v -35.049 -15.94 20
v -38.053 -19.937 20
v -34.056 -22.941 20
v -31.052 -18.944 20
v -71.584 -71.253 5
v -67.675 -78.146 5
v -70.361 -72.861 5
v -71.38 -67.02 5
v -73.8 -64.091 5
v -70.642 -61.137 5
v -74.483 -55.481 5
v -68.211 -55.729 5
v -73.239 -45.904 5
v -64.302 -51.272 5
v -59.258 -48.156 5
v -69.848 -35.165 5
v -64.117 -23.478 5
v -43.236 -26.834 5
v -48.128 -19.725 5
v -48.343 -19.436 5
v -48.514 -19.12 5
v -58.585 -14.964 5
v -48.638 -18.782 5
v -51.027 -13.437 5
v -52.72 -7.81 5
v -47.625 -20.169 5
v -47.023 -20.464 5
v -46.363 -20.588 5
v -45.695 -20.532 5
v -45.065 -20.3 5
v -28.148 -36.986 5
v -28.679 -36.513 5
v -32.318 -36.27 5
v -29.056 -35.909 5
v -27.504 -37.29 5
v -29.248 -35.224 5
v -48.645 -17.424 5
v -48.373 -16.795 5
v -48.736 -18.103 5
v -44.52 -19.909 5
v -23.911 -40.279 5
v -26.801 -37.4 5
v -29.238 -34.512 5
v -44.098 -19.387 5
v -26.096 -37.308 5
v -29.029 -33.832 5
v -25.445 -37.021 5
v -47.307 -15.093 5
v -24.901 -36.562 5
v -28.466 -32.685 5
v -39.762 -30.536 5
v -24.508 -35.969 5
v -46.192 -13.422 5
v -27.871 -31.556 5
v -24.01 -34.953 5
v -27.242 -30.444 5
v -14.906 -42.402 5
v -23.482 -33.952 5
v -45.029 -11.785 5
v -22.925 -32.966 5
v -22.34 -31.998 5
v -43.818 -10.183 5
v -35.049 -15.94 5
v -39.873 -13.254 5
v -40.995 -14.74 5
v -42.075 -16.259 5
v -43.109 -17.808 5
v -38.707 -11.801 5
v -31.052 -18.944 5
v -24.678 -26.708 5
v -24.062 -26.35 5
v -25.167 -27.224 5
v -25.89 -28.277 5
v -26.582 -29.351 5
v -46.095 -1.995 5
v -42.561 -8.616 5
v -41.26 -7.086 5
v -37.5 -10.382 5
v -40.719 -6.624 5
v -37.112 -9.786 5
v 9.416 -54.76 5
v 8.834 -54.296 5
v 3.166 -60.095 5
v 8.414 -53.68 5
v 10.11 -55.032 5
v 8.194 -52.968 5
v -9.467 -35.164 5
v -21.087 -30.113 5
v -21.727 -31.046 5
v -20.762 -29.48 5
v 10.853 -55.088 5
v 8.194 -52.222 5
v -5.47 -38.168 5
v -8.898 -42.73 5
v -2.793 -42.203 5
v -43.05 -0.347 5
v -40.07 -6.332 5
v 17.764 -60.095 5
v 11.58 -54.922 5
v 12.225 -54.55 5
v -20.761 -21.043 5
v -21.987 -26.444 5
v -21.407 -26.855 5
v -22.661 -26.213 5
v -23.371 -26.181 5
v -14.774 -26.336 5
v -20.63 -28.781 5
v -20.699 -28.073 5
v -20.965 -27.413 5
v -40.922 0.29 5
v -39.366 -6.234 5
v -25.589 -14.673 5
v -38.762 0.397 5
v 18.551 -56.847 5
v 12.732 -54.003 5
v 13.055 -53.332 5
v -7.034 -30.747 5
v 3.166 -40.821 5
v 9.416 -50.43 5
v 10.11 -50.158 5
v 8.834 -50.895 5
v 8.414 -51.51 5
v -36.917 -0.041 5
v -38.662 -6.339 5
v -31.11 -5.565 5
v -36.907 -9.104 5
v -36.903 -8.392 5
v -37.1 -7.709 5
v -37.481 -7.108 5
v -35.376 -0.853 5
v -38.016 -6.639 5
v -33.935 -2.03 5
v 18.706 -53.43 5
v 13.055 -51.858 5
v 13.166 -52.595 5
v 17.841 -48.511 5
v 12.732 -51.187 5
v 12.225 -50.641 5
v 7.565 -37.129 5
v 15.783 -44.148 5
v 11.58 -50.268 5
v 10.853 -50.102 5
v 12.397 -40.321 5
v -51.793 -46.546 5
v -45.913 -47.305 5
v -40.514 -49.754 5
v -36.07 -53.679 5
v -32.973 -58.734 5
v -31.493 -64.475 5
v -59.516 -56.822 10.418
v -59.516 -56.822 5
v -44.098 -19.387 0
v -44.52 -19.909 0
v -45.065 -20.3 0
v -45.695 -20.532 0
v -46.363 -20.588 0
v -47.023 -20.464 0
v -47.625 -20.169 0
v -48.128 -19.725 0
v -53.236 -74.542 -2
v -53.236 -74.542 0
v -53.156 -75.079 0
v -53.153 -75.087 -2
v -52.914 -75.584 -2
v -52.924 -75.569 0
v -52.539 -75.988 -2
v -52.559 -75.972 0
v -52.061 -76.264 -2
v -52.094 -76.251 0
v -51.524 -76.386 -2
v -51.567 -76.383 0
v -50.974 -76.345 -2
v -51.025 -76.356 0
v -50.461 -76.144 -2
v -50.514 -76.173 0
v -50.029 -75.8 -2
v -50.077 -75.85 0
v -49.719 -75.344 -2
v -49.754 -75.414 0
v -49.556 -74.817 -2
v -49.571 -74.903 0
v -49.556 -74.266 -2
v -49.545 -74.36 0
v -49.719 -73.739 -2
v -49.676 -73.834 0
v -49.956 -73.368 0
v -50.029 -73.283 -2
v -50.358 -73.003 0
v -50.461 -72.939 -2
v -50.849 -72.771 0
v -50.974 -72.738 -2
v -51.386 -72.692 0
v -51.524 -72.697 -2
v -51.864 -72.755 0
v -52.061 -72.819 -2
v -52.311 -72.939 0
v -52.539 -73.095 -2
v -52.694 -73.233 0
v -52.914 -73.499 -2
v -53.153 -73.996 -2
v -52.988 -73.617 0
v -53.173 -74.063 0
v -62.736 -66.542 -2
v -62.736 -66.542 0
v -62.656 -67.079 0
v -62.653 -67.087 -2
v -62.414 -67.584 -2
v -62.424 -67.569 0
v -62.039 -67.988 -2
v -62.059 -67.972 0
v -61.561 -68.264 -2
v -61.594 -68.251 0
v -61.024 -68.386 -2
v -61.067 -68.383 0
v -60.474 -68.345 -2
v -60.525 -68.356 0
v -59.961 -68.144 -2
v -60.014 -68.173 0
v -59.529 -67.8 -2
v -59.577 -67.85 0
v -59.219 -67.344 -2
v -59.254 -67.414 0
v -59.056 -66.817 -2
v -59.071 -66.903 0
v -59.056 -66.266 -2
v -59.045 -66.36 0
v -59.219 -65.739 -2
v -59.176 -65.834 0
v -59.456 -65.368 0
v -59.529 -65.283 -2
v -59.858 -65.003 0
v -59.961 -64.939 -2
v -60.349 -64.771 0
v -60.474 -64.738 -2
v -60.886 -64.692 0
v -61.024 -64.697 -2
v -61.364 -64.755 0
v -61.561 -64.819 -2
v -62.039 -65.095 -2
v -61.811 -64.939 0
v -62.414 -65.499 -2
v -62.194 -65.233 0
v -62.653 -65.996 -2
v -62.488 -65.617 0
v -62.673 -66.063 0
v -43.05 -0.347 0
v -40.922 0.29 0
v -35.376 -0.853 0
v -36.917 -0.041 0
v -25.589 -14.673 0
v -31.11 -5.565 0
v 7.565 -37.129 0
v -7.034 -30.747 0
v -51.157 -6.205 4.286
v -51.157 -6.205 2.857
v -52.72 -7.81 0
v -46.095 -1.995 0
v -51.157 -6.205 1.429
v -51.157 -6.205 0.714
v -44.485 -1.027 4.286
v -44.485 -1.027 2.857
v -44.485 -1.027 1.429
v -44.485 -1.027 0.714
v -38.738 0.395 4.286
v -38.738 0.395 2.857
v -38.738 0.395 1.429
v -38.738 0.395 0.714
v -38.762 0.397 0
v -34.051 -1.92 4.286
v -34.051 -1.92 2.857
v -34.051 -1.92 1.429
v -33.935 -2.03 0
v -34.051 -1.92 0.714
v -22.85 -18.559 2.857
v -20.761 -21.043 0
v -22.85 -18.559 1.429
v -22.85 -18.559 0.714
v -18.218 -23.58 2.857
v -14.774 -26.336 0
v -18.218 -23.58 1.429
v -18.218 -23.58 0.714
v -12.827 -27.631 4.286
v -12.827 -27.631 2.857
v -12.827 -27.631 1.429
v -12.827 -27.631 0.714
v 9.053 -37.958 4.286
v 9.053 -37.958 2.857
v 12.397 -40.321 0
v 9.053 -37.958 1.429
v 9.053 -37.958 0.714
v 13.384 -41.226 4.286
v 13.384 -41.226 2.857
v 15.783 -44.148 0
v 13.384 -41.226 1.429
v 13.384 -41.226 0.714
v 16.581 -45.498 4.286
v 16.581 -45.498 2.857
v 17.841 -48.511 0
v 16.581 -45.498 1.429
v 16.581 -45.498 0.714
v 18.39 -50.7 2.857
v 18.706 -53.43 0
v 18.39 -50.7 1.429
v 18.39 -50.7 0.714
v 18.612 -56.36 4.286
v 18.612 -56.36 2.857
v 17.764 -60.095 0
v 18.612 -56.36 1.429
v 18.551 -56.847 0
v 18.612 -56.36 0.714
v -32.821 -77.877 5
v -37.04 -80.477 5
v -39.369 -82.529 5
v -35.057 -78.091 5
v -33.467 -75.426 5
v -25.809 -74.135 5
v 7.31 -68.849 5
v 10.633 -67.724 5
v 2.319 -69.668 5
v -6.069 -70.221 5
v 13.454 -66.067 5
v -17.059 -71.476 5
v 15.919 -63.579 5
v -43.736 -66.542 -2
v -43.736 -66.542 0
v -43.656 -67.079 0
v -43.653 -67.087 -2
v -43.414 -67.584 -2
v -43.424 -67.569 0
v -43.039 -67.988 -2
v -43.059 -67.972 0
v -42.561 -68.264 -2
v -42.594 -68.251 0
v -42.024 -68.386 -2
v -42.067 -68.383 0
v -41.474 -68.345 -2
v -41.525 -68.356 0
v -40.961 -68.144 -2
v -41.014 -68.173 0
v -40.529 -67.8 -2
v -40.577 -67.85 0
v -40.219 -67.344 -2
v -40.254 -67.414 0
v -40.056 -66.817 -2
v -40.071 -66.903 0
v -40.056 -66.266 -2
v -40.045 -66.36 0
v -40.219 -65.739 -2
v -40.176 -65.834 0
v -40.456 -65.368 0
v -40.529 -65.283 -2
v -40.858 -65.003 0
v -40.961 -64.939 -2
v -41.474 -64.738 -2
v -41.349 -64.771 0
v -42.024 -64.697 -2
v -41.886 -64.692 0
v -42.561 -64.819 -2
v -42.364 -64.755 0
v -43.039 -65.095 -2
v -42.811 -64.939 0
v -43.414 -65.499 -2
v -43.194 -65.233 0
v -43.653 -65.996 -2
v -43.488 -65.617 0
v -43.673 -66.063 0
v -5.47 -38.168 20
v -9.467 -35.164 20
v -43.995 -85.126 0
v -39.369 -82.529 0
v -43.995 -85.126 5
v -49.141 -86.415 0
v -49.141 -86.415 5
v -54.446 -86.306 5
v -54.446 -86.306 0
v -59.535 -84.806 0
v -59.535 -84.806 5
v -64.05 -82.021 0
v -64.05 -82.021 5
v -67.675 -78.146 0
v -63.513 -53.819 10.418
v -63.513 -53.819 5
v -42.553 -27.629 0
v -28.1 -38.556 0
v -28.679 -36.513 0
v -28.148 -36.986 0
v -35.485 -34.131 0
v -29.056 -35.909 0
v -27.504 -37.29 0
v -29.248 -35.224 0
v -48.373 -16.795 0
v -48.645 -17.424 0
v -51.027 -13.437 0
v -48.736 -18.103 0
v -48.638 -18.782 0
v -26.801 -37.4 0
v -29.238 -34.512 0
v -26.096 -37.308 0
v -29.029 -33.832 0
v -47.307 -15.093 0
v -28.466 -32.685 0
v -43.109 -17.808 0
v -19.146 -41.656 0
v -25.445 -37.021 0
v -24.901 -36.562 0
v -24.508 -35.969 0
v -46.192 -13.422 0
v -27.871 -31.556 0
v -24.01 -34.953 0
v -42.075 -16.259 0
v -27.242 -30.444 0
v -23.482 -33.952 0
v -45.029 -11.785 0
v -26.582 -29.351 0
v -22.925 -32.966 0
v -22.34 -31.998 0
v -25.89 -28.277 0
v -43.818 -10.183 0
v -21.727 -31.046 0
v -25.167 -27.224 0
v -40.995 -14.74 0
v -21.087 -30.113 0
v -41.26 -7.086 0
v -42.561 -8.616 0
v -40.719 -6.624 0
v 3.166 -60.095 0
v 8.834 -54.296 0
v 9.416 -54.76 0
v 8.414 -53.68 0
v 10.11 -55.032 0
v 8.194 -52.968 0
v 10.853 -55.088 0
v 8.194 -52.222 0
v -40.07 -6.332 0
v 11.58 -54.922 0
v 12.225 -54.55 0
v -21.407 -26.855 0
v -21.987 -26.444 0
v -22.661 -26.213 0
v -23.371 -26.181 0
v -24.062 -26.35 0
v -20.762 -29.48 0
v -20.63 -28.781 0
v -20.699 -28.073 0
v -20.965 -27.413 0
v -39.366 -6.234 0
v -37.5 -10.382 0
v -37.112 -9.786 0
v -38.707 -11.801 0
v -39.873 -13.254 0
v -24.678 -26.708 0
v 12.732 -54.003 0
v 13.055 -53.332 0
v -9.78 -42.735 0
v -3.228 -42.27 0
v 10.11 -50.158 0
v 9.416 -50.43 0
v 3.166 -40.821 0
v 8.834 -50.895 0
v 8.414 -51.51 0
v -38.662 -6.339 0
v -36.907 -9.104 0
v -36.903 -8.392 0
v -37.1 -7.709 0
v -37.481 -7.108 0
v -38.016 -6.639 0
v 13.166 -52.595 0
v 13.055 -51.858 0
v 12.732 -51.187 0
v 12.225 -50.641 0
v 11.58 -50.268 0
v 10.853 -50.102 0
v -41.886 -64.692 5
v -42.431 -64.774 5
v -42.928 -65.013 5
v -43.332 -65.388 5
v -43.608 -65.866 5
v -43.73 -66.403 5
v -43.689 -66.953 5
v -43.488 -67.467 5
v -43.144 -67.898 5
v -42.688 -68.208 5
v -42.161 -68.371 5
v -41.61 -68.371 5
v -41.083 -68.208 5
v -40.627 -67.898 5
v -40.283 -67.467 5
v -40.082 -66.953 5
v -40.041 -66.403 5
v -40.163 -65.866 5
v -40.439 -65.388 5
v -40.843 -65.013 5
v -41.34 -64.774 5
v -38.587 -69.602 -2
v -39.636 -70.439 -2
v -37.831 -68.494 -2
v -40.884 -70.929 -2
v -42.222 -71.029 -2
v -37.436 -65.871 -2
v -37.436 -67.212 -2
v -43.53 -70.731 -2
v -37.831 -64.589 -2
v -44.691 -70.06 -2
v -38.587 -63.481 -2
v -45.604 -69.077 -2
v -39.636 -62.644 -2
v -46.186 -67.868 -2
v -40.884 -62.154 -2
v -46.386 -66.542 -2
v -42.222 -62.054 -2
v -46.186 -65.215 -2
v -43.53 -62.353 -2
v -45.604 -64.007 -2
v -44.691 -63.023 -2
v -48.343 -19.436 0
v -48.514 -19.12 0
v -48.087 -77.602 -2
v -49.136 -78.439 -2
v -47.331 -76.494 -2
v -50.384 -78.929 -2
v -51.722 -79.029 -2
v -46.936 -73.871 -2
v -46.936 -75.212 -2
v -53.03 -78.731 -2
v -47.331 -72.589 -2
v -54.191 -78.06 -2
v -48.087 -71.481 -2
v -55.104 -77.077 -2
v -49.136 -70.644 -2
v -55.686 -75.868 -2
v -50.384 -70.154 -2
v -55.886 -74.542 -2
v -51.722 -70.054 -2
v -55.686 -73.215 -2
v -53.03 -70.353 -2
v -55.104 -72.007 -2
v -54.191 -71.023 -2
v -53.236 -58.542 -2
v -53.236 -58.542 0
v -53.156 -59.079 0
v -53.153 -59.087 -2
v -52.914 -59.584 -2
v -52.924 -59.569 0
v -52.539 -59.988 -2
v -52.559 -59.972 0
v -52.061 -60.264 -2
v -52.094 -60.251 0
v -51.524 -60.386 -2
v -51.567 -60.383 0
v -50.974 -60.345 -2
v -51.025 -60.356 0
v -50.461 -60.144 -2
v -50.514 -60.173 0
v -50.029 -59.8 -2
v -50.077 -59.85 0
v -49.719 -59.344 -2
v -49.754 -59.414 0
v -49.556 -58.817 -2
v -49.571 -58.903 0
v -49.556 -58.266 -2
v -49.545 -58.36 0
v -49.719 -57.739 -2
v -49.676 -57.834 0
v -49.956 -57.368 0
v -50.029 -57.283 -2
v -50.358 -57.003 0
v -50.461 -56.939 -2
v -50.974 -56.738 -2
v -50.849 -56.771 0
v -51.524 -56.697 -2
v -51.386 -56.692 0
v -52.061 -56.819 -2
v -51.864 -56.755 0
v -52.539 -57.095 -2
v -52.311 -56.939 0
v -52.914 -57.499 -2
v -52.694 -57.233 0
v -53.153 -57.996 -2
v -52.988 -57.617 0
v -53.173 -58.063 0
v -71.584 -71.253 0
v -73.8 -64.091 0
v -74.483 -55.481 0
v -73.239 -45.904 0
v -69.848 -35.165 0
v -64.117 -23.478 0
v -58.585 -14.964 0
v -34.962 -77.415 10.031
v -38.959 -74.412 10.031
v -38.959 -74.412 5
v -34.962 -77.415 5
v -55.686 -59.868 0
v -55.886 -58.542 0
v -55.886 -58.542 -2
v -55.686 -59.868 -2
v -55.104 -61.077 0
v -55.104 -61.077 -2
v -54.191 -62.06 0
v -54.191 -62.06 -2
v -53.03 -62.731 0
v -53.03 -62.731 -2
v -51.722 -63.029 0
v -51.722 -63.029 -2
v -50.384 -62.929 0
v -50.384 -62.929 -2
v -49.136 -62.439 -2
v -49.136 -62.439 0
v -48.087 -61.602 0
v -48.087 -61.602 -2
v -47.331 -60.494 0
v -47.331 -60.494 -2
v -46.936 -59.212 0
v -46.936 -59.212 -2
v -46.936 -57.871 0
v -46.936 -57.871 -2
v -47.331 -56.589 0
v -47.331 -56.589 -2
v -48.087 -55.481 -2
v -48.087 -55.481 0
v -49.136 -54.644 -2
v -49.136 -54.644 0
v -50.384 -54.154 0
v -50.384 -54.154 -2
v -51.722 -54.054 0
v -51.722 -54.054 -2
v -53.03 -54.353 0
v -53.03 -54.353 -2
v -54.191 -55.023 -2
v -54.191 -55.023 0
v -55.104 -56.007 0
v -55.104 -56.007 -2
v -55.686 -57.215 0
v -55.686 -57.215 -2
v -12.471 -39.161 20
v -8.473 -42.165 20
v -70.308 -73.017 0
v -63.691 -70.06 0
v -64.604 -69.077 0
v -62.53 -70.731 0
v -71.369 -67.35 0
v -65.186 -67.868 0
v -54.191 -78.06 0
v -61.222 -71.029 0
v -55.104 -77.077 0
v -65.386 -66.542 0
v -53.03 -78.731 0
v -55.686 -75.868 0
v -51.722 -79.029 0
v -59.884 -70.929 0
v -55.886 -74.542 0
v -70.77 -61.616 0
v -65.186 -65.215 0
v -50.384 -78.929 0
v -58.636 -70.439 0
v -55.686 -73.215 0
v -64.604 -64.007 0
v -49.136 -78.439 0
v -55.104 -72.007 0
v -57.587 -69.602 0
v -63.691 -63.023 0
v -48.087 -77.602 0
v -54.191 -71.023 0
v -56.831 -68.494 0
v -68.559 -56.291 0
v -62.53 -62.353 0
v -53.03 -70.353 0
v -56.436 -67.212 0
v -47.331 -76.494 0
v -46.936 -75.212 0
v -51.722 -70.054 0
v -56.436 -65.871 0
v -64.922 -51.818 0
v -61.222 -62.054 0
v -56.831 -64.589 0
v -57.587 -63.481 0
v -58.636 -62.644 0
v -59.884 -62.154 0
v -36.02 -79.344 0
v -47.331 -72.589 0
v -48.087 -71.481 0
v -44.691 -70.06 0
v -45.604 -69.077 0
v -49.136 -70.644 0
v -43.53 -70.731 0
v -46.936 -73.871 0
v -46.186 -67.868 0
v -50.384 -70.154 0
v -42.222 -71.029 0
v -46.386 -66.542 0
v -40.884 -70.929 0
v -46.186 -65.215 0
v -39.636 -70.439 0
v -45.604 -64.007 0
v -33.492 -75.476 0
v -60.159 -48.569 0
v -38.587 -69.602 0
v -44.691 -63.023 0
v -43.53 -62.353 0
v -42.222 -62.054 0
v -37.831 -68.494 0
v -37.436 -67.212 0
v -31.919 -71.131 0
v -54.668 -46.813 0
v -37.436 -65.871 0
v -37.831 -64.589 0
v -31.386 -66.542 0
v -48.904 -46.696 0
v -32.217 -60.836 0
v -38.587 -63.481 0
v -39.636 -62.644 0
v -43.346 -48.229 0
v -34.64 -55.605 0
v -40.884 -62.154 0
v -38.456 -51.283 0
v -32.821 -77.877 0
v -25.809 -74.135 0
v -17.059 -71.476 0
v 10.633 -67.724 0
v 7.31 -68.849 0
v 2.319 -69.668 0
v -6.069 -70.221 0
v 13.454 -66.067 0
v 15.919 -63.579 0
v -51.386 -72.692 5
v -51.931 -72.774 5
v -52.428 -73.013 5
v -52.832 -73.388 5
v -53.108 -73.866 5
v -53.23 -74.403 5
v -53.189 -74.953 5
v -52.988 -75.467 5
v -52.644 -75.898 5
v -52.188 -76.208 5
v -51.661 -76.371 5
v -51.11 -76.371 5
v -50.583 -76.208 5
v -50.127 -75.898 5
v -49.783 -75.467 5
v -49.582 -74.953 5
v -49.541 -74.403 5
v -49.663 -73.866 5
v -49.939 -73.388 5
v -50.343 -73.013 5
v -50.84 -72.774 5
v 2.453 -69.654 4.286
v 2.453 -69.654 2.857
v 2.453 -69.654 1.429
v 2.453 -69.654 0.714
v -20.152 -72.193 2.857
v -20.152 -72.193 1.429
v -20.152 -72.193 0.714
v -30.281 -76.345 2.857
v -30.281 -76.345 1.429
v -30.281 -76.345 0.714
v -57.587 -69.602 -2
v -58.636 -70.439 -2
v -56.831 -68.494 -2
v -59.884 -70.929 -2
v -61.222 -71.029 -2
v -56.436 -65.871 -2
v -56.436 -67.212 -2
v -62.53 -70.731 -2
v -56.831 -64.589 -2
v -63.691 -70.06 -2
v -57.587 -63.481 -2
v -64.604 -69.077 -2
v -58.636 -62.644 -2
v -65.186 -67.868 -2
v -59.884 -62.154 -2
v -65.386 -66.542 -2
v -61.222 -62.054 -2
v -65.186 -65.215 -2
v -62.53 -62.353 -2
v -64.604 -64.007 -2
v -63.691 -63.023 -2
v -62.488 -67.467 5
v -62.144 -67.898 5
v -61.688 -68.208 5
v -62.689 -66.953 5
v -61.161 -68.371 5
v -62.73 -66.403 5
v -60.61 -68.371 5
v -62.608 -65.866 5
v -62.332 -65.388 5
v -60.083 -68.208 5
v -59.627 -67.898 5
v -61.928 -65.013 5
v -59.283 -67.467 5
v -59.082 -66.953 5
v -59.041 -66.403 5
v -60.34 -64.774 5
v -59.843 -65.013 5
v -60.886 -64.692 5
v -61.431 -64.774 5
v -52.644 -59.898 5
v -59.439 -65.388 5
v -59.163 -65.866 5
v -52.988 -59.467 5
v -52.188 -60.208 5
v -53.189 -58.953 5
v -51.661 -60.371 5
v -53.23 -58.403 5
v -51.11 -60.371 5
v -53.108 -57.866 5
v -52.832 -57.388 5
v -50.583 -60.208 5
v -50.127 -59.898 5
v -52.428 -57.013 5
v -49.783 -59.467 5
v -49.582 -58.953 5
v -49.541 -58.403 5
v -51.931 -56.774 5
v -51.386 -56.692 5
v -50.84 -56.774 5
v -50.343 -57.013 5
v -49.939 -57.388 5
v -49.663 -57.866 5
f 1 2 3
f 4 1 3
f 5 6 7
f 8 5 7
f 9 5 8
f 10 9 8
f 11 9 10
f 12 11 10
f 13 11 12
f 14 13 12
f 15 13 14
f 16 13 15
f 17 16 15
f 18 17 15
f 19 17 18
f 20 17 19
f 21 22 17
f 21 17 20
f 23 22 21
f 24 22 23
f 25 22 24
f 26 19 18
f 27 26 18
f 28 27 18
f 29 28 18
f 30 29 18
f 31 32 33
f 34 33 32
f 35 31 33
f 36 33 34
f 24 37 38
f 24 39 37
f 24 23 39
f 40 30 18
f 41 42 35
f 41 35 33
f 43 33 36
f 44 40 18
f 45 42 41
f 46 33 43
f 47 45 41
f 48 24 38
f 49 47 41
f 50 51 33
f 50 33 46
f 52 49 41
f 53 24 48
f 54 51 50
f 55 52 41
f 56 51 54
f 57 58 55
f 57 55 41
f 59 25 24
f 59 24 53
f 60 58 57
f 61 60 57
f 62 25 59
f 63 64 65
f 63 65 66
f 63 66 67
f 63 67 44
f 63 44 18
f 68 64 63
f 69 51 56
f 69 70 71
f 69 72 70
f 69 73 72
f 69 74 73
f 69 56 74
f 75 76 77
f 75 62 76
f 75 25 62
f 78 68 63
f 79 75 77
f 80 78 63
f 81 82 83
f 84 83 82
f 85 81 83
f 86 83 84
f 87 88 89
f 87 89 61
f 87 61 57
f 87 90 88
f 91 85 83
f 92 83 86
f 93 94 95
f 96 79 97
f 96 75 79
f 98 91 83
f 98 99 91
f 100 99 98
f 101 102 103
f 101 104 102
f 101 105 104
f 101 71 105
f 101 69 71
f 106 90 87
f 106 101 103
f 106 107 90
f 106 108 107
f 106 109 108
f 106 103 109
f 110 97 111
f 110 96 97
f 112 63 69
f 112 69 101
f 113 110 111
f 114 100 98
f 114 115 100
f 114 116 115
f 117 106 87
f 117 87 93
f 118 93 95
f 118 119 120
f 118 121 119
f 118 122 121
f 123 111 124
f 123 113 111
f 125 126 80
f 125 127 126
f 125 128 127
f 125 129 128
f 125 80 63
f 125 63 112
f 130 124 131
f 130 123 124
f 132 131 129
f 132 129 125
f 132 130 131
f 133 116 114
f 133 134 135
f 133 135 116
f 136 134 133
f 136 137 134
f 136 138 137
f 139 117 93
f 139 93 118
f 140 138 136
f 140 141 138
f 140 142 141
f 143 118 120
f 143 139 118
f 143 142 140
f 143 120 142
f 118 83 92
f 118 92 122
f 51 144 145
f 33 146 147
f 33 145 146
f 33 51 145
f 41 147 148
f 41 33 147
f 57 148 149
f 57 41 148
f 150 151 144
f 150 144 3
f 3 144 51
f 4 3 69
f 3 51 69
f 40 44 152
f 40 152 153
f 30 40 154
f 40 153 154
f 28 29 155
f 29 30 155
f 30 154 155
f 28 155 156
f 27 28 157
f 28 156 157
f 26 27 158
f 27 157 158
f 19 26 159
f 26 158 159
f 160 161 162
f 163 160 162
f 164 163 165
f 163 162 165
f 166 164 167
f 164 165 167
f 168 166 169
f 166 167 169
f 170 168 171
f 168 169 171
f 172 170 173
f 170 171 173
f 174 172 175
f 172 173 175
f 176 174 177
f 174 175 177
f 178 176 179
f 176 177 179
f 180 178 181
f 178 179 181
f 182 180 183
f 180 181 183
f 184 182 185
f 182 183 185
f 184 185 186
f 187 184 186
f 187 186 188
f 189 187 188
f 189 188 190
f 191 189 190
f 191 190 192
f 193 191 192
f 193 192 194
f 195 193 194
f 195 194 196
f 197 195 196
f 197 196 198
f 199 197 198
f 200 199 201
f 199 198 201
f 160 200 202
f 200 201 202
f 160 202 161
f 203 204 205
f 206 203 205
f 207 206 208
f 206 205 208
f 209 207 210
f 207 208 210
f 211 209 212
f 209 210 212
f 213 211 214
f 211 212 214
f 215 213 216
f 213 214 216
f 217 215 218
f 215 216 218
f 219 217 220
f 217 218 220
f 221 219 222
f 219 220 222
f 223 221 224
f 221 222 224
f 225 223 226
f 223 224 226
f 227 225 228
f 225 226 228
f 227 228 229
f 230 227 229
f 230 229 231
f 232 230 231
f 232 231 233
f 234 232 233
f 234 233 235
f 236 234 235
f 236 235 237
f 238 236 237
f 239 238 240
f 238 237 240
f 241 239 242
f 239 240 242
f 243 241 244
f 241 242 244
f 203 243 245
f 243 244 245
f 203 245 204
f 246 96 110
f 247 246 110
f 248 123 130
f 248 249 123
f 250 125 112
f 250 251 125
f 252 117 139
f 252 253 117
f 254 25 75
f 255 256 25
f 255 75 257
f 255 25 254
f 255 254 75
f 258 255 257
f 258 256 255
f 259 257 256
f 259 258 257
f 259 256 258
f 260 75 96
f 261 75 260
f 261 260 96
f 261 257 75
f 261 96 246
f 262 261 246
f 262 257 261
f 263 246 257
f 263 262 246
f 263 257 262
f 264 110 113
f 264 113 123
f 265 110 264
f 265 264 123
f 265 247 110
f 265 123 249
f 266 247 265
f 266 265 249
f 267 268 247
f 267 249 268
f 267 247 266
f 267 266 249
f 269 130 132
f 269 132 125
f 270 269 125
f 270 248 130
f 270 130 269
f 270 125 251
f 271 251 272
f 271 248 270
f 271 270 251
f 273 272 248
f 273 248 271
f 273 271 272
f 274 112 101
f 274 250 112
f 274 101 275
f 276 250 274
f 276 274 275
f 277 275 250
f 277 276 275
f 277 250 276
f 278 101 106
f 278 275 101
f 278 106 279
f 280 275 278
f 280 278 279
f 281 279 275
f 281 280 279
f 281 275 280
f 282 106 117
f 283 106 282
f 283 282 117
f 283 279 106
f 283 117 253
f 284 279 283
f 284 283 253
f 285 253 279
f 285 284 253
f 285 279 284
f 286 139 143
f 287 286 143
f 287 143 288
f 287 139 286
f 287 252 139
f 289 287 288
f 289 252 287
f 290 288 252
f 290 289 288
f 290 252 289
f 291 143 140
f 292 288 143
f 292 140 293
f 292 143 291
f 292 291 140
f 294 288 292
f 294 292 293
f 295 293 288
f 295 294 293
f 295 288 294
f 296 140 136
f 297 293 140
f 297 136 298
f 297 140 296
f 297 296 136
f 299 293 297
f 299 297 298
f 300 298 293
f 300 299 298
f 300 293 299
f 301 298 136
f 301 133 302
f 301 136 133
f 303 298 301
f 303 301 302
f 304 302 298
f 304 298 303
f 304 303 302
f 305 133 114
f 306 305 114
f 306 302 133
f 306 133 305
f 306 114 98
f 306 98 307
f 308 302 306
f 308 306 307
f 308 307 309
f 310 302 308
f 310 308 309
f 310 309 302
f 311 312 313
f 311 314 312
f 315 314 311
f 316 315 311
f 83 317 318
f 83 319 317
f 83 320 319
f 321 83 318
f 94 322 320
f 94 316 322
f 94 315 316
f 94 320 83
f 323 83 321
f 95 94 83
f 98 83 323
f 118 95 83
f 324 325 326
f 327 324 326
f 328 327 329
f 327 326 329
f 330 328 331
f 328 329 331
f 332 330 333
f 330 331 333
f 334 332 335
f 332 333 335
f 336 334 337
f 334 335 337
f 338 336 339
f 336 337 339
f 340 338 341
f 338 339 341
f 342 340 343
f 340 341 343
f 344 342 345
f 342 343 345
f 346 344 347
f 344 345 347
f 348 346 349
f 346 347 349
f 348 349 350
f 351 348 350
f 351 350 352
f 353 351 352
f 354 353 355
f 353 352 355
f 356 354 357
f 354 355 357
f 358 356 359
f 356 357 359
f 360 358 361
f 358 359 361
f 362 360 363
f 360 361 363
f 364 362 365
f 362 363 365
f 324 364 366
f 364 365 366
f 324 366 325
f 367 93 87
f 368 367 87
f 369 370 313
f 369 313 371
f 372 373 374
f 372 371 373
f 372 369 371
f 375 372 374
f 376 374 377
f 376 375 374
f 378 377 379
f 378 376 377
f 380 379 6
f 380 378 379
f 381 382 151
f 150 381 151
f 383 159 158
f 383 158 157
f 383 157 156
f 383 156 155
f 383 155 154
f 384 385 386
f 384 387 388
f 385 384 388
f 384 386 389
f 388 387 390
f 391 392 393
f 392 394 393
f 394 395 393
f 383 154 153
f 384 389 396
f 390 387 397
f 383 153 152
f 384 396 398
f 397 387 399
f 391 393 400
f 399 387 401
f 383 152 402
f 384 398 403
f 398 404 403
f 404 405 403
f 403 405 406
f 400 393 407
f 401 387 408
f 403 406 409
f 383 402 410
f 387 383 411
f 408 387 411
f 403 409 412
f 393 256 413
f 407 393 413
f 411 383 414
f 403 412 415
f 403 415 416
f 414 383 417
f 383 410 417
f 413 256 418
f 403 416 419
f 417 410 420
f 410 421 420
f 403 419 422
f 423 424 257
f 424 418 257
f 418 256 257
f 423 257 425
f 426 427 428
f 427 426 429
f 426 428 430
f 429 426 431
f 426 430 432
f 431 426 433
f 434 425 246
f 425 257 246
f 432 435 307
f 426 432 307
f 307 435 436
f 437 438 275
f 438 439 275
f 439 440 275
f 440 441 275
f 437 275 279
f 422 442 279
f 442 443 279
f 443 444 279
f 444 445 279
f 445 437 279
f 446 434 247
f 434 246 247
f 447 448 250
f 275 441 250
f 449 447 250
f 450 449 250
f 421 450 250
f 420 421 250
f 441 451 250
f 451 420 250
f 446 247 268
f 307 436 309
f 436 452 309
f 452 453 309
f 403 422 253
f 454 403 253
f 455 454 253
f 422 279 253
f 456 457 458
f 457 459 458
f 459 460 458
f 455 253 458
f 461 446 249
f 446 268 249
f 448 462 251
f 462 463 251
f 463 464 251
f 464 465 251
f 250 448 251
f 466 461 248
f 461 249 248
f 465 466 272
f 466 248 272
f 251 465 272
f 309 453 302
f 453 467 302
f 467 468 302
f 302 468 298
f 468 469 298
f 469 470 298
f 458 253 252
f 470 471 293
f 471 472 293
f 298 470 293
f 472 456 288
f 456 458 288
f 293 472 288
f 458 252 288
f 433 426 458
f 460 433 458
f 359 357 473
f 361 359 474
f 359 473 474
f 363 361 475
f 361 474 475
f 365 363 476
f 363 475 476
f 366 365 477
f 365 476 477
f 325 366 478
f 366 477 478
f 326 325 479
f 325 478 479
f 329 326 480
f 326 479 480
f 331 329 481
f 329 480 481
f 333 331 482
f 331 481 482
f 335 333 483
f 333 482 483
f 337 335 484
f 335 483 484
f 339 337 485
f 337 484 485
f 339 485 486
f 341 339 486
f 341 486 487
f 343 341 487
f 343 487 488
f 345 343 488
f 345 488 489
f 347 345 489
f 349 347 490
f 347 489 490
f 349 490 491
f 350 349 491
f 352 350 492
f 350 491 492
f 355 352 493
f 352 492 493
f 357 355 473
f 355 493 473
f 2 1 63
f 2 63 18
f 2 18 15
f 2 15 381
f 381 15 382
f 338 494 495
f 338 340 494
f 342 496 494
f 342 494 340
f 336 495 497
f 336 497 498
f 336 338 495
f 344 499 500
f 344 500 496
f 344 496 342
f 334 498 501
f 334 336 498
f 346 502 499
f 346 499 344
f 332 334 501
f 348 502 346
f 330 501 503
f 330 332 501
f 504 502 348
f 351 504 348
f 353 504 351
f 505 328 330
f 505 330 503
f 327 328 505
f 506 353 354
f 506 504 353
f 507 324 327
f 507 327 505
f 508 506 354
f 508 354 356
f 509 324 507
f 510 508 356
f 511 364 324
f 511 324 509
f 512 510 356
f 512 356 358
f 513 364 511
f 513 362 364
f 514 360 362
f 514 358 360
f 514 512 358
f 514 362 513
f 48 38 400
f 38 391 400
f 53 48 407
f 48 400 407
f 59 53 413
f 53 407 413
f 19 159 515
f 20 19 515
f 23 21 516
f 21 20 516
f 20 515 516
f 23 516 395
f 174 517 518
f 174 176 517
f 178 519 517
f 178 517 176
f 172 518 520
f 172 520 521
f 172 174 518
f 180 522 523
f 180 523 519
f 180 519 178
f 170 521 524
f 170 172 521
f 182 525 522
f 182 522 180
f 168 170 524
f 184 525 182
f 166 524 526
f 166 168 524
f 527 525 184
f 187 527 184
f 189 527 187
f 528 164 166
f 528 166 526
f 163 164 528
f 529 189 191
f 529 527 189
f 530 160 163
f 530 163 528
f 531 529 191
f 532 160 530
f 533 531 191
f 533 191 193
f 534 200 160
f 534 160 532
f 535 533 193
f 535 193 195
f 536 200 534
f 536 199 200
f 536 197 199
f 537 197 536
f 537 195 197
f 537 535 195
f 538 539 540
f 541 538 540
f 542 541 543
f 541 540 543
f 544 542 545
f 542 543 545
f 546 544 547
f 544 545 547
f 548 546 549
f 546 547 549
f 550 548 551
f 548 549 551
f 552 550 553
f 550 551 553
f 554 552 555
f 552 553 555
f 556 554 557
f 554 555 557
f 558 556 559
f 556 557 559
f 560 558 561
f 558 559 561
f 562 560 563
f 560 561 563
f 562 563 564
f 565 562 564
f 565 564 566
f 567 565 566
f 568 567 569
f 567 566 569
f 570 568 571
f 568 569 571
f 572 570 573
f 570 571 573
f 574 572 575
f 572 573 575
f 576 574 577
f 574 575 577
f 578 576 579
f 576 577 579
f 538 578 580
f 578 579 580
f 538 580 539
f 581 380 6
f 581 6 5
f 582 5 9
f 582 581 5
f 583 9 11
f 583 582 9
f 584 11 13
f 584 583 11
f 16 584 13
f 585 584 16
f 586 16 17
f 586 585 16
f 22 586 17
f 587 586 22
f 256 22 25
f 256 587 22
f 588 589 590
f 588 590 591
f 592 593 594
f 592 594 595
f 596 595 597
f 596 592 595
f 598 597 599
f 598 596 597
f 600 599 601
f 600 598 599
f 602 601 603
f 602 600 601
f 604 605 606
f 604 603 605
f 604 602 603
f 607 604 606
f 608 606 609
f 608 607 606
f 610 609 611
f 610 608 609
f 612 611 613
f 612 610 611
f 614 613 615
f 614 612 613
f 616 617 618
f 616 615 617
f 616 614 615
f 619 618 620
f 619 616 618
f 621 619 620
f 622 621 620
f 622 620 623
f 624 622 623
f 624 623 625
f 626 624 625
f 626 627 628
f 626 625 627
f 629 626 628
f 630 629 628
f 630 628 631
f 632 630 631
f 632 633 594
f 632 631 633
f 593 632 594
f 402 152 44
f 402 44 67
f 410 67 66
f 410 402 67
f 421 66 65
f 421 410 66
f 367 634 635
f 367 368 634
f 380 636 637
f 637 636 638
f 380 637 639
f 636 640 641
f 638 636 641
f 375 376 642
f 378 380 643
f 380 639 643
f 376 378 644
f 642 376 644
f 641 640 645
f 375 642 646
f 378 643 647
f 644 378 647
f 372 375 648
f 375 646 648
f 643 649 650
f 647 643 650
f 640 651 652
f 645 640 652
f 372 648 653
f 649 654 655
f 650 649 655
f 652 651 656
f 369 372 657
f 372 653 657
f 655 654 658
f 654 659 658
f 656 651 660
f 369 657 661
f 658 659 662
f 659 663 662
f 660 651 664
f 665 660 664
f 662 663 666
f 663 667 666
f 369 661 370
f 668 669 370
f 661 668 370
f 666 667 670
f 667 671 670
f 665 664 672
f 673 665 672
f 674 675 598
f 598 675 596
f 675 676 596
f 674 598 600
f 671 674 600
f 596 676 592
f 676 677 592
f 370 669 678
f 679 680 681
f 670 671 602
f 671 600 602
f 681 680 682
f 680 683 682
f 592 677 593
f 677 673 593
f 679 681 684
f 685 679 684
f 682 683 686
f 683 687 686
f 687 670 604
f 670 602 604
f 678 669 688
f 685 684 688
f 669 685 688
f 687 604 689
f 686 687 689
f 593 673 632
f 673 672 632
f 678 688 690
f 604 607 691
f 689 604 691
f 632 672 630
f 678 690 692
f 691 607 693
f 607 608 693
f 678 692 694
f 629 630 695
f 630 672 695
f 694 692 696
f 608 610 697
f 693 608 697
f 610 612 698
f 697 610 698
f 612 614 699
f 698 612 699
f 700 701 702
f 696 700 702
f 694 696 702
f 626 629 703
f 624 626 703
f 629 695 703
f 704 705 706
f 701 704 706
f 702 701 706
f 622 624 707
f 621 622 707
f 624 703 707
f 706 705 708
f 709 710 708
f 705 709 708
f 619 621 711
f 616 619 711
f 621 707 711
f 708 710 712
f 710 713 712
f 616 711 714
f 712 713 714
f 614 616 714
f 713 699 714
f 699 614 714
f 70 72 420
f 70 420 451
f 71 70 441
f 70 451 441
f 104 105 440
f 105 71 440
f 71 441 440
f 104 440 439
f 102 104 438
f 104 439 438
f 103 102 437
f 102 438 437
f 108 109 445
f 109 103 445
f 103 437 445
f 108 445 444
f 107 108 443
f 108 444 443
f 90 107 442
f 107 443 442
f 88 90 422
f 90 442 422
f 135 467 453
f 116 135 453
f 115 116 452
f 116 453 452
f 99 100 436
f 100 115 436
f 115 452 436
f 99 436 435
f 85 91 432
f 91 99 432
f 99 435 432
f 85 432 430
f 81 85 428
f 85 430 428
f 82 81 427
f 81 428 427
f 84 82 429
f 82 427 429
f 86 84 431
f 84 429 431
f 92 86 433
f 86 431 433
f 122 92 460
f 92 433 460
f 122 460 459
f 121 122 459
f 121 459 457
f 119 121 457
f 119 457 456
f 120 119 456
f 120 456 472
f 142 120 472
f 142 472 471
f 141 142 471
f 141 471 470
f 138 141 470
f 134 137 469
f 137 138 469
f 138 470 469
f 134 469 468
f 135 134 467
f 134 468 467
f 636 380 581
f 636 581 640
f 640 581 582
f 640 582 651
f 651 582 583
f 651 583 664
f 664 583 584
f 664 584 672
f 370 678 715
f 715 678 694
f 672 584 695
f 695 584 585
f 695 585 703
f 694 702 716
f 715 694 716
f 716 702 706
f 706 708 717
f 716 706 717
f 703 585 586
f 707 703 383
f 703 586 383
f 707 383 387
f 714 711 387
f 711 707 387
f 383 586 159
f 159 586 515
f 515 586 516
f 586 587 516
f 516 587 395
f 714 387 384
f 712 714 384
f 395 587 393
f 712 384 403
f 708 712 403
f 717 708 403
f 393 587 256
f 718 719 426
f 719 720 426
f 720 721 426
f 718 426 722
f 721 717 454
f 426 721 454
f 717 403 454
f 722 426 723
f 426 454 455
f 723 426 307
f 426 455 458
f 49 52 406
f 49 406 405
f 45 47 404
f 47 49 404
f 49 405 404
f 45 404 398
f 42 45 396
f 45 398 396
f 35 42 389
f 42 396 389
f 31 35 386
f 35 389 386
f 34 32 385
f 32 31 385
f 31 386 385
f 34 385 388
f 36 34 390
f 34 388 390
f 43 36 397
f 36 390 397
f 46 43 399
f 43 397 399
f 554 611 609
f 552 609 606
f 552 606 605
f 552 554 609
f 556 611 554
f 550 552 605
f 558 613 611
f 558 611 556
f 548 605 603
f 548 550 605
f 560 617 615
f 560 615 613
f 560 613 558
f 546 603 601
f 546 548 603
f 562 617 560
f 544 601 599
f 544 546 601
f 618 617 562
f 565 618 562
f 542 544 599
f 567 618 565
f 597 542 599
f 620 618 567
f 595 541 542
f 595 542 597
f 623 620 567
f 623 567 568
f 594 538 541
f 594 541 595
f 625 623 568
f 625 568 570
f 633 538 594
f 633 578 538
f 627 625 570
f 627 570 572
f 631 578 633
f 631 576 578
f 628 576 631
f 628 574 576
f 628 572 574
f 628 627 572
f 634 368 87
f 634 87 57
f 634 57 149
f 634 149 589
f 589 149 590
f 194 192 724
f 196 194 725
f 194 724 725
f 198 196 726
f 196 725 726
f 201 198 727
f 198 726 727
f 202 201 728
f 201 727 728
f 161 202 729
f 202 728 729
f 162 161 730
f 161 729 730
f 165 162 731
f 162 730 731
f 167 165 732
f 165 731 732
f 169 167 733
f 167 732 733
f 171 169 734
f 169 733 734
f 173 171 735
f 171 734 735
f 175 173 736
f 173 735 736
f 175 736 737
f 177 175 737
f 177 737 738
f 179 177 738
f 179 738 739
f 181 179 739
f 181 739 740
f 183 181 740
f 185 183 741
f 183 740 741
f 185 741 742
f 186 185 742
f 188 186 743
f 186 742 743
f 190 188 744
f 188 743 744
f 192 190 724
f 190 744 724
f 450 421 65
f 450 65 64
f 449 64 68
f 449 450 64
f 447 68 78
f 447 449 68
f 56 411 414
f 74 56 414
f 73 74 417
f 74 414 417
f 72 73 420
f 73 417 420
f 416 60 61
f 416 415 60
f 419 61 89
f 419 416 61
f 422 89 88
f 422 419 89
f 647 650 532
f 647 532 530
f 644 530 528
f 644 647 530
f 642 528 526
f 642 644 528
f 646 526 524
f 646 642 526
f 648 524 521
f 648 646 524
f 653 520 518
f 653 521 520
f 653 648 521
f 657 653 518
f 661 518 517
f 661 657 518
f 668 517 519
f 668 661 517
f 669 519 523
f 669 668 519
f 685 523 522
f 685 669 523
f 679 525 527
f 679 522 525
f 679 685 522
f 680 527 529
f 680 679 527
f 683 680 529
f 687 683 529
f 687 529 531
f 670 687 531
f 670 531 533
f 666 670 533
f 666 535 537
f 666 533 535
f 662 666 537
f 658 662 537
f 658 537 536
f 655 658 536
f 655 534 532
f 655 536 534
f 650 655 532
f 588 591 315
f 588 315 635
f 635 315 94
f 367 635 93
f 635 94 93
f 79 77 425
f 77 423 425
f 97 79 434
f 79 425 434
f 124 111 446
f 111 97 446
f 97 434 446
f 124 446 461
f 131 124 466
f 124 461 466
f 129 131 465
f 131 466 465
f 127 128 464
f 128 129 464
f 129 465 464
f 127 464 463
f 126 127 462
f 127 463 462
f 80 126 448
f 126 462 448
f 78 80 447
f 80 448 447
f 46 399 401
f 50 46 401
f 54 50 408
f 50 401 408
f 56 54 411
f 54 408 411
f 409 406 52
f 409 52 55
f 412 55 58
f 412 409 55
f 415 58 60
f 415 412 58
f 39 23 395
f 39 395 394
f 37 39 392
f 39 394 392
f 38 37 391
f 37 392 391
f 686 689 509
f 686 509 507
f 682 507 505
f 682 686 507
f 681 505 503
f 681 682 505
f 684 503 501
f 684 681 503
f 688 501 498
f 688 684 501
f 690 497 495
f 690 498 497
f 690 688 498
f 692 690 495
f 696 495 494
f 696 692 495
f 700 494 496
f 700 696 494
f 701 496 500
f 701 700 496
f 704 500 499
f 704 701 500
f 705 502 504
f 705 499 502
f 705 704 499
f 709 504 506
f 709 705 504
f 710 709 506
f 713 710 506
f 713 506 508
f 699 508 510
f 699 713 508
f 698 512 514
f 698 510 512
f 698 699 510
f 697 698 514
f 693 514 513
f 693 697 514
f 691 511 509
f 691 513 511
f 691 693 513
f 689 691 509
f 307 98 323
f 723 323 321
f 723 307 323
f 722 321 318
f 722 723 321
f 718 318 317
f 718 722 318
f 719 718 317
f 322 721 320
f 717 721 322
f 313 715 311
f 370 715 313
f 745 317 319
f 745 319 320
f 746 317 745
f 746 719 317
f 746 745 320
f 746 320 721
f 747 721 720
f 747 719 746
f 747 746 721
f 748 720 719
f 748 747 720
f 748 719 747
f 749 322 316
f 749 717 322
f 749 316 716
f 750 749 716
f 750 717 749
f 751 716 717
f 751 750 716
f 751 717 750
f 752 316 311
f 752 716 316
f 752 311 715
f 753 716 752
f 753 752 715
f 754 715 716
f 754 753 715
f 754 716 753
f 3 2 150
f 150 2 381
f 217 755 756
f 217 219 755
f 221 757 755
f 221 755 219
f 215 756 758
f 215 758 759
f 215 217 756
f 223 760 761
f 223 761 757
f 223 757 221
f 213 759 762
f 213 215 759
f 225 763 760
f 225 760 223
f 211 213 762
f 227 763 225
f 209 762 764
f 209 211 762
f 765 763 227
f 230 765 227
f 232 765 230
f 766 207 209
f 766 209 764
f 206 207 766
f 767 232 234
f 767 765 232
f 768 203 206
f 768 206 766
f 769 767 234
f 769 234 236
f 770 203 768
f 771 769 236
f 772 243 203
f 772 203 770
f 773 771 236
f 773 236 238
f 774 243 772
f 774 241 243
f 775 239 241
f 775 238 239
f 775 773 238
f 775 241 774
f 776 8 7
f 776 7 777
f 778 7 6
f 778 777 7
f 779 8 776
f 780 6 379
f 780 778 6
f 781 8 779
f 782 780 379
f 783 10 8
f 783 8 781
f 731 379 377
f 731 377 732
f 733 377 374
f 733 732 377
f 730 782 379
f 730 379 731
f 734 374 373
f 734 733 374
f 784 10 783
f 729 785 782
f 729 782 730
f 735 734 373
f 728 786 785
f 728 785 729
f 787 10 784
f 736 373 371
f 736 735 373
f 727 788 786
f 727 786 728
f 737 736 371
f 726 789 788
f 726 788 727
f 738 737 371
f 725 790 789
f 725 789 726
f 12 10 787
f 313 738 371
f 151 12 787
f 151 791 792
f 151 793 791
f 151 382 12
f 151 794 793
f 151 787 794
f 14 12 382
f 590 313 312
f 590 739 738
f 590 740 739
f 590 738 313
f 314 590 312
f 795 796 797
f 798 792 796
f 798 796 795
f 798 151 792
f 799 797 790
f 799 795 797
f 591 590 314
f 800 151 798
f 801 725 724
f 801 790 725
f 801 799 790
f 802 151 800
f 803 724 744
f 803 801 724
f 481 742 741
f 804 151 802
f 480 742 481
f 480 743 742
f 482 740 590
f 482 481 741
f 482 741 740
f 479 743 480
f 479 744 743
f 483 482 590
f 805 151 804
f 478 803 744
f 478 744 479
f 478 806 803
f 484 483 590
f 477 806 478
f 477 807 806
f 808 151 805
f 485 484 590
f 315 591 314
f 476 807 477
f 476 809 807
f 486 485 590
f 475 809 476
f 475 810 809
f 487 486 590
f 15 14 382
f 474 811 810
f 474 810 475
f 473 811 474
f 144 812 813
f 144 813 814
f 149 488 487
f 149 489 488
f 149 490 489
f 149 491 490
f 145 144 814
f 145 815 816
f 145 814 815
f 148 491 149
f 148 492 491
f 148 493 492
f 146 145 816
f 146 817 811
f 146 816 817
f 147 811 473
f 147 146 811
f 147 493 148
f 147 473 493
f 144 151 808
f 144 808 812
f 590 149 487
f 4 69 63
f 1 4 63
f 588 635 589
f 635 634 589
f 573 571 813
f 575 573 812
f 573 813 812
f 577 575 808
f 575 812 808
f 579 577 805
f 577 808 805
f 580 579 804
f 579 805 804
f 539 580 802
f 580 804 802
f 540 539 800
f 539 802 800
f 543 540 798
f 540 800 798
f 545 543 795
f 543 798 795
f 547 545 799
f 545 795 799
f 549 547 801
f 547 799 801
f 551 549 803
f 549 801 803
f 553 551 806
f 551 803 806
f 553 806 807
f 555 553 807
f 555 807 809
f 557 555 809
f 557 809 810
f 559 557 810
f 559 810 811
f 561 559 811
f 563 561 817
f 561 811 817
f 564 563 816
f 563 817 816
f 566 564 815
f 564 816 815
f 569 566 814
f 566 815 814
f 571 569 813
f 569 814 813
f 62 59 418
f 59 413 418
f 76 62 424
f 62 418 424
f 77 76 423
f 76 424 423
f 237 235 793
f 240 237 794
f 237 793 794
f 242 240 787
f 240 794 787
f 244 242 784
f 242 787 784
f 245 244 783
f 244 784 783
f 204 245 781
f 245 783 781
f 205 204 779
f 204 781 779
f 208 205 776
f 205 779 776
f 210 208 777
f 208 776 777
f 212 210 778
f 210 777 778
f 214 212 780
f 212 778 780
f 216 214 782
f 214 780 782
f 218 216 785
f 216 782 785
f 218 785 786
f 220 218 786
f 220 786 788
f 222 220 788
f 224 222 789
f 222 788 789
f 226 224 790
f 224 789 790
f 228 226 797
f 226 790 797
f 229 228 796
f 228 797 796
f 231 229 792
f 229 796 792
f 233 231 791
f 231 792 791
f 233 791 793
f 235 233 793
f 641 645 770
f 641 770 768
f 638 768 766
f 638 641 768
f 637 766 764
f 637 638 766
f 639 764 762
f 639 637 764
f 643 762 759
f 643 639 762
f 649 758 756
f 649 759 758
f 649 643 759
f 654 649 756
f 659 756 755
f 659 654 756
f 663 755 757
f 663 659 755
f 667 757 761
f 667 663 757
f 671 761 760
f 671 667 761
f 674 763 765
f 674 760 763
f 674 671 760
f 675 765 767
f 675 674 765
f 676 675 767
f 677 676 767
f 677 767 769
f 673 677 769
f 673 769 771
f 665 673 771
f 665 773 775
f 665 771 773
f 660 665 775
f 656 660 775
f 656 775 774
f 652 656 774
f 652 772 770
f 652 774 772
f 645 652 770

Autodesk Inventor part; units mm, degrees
ref_plane "YZ Plane" through (0, 0, 0) normal (1, 0, 0) x (0, 1, 0)
ref_plane "XZ Plane" through (0, 0, 0) normal (0, 1, 0) x (-1, 0, 0)
ref_plane "XY Plane" through (0, 0, 0) normal (0, 0, 1) x (1, 0, 0)
ref_plane "Work Plane1" through (0, 0, 0) normal (0, 0, 1) x (1, 0, 0)
sketch "Sketch1" plane through (0, 0, 0) normal (0, 0, 1) x (1, 0, 0)
  circle A0 centre (-25.0838, -31.7051) radius 2.5 projected
  circle A1 centre (-43.012, -13.2629) radius 2.5 projected
  circle A2 centre (-44.8914, 13.7567) radius 2.5 projected
  circle A3 centre (-28.0838, 36.7109) radius 2.5 projected
  circle A4 centre (0.8935, 43.7288) radius 2.5 projected
  circle A5 centre (29.5533, 30.4373) radius 2.5 projected
  circle A6 centre (43.6662, -0.0951) radius 2.5 projected
  circle A7 centre (47.6662, -52.5951) radius 2.5 projected
  circle A8 centre (10.6662, -52.5951) radius 2.5 projected
  circle A9 centre (-6.8338, -0.0951) radius 8.75 projected
  line L0 (56.6662, -60.0951) -> (51.1662, -0.0951) projected
  spline S0 degree 4 poles (51.1662, -0.0951) (50.0319, 24.6801) (26.25, 55.8136) (-25.1104, 60.0951) (-56.6662, 18.5311) (-54.7055, -22.2338) (-29.645, -43.1708) (-8.3823, -44.3792) (3.1662, -40.8213) knots 0 0 0 0 0 0.330099 0.457579 0.582312 0.704438 0.895347 0.895347 0.895347 0.895347 0.895347 projected
  line L1 (3.1662, -40.8213) -> (3.1662, -60.0951) projected
  line L2 (3.1662, -60.0951) -> (56.6662, -60.0951) projected
  circle A10 centre (-6.8338, -0.0951) radius 80 construction
  circle A11 centre (-51.3856, -66.5416) radius 20
  spline S1 degree 4 poles (-67.6748, -78.146) (-80.1343, -60.6563) (-73.4442, -28.8039) (-34.6199, 23.5084) (-28.149, -22.306) (-1.1527, -34.0954) (21.6131, -40.077) (20.0804, -79.4594) (-16.1771, -65.3424) (-30.503, -75.865) (-39.3686, -82.5289) knots 0 0 0 0 0 0.227581 0.363335 0.480166 0.59047 0.703016 0.817261 1 1 1 1 1
  line L3 (10.6662, -52.5951) -> (-43.012, -13.2629) construction
  line L4 (-25.0838, -31.7051) -> (10.6662, -52.5951) construction
  line L5 (10.6662, -52.5951) -> (-42.0733, -6.3735) construction
  line L6 (10.6662, -52.5951) -> (-49.6403, -16.0265) construction
  arc A12 (-37.4996, -10.382) -> (-40.9954, -14.7405) centre (10.6662, -52.5951) ccw
  arc A13 (-40.9954, -14.7405) -> (-44.098, -19.3872) centre (10.6662, -52.5951) ccw
  arc A14 (-41.2598, -7.0865) -> (-45.0286, -11.7853) centre (10.6662, -52.5951) ccw
  arc A15 (-45.0286, -11.7853) -> (-48.3734, -16.7947) centre (10.6662, -52.5951) ccw
  arc A16 (-37.4996, -10.382) -> (-41.2598, -7.0865) centre (-39.3797, -8.7342) ccw
  arc A17 (-48.3734, -16.7947) -> (-44.098, -19.3872) centre (-46.2357, -18.0909) ccw
  line L7 (10.6662, -52.5951) -> (-30.2455, -33.2568) construction
  line L8 (10.6662, -52.5951) -> (-26.0132, -26.6253) construction
  arc A18 (-21.0867, -30.1134) -> (-24.5082, -35.9687) centre (10.6662, -52.5951) ccw
  arc A19 (-25.1674, -27.2241) -> (-29.0287, -33.832) centre (10.6662, -52.5951) ccw
  arc A20 (-21.0867, -30.1134) -> (-25.1674, -27.2241) centre (-23.1271, -28.6687) ccw
  arc A21 (-29.0287, -33.832) -> (-24.5082, -35.9687) centre (-26.7685, -34.9004) ccw
  point P0 (0, 0)
  point P1 (-60.5912, -17.8314)
  point P2 (-36.7792, -0.096)
  point P3 (-23.1279, -18.1974)
  point P4 (0.0342, -33.7731)
  point P5 (16.7837, -45.8922)
  point P6 (15.1081, -64.5601)
  point P7 (-10.6842, -70.5676)
  point P8 (-45.0286, -11.7853)
  point P9 (-21.0867, -30.1134)
  dimension "d0" = 160
  dimension "d1" = 40
  dimension "d2" = 5
  dimension "d3" = 5
  dimension "d4" = 2.5
  dimension "d5" = 5
  dimension "d6" = 5
extrude "Extrusion1" add sketch "Sketch1" along normal blind 5 contours A15 A17 S0 S1 L2 L1 A13 A12 A16 A14 | A11 | A17 S0 L1 L2 S1 A11
sketch "Sketch2" plane through (0, 0, 0) normal (0, 0, -1) x (-1, 0, 0)
  arc A0 (39.3686, -82.5289) -> (67.6748, -78.146) centre (51.3856, -66.5416) ccw projected
  circle A1 centre (51.3856, -66.5416) radius 8 construction
  circle A2 centre (51.3856, -66.5416) radius 9.5 construction
  point P0 (0, 0)
  point P1 (60.8856, -66.5416)
  point P2 (41.8856, -66.5416)
  point P3 (51.3856, -74.5416)
  point P4 (51.3856, -58.5416)
  dimension "d9" = 16
  dimension "d10" = 19
hole "Hole1" at (-60.8856, -66.5416, 0) at (-41.8856, -66.5416, 0) at (-51.3856, -74.5416, 0) at (-51.3856, -58.5416, 0) direction (0, 0, 1) diameter 3.7 end through all
sketch "Sketch3" plane through (0, 0, 0) normal (0, 0, -1) x (-1, 0, 0)
  circle A0 centre (51.3856, -58.5416) radius 1.85 projected
  circle A1 centre (51.3856, -74.5416) radius 1.85 projected
  circle A2 centre (41.8856, -66.5416) radius 1.85 projected
  circle A3 centre (60.8856, -66.5416) radius 1.85 projected
  arc A4 (39.3686, -82.5289) -> (67.6748, -78.146) centre (51.3856, -66.5416) ccw projected
  arc A5 (44.098, -19.3872) -> (48.3734, -16.7947) centre (46.2357, -18.0909) ccw projected
  arc A6 (44.098, -19.3872) -> (37.4996, -10.382) centre (-10.6662, -52.5951) ccw projected
  arc A7 (41.2598, -7.0865) -> (37.4996, -10.382) centre (39.3797, -8.7342) ccw projected
  arc A8 (48.3734, -16.7947) -> (41.2598, -7.0865) centre (-10.6662, -52.5951) ccw projected
  arc A9 (25.1674, -27.2241) -> (21.0867, -30.1134) centre (23.1271, -28.6687) ccw projected
  arc A10 (29.0287, -33.832) -> (25.1674, -27.2241) centre (-10.6662, -52.5951) ccw projected
  arc A11 (24.5082, -35.9687) -> (29.0287, -33.832) centre (26.7685, -34.9004) ccw projected
  arc A12 (24.5082, -35.9687) -> (21.0867, -30.1134) centre (-10.6662, -52.5951) ccw projected
  circle A13 centre (-10.6662, -52.5951) radius 2.5 projected
  circle A14 centre (60.8856, -66.5416) radius 4.5
  circle A15 centre (51.3856, -74.5416) radius 4.5
  circle A16 centre (41.8856, -66.5416) radius 4.5
  circle A17 centre (51.3856, -58.5416) radius 4.5
  point P0 (0, 0)
  dimension "d18" = 9
  dimension "d19" = 9
  dimension "d20" = 9
  dimension "d21" = 9
extrude "Extrusion2" add sketch "Sketch3" along normal blind 2 contours A14 | A15 | A16 | A17
sketch "Sketch4" plane through (0, 0, 5) normal (0, 0, 1) x (1, 0, 0)
  circle A0 centre (-51.3856, -58.5416) radius 1.85 projected
  circle A1 centre (-51.3856, -74.5416) radius 1.85 projected
  circle A2 centre (-41.8856, -66.5416) radius 1.85 projected
  circle A3 centre (-60.8856, -66.5416) radius 1.85 projected
  arc A4 (-67.6748, -78.146) -> (-39.3686, -82.5289) centre (-51.3856, -66.5416) ccw projected
  arc A5 (-48.3734, -16.7947) -> (-44.098, -19.3872) centre (-46.2357, -18.0909) ccw projected
  arc A6 (-41.2598, -7.0865) -> (-48.3734, -16.7947) centre (10.6662, -52.5951) ccw projected
  arc A7 (-37.4996, -10.382) -> (-41.2598, -7.0865) centre (-39.3797, -8.7342) ccw projected
  arc A8 (-37.4996, -10.382) -> (-44.098, -19.3872) centre (10.6662, -52.5951) ccw projected
  arc A9 (-21.0867, -30.1134) -> (-25.1674, -27.2241) centre (-23.1271, -28.6687) ccw projected
  arc A10 (-21.0867, -30.1134) -> (-24.5082, -35.9687) centre (10.6662, -52.5951) ccw projected
  arc A11 (-29.0287, -33.832) -> (-24.5082, -35.9687) centre (-26.7685, -34.9004) ccw projected
  arc A12 (-25.1674, -27.2241) -> (-29.0287, -33.832) centre (10.6662, -52.5951) ccw projected
  circle A13 centre (10.6662, -52.5951) radius 2.5 projected
  line L0 (-35.0492, -15.9402) -> (-63.5128, -53.8187)
  line L1 (-63.5128, -53.8187) -> (-59.5155, -56.8224)
  line L2 (-59.5155, -56.8224) -> (-31.0519, -18.9439)
  line L3 (-31.0519, -18.9439) -> (-35.0492, -15.9402)
  line L4 (-9.4669, -35.1638) -> (-38.9594, -74.4116)
  line L5 (-38.9594, -74.4116) -> (-34.9622, -77.4153)
  line L6 (-34.9622, -77.4153) -> (-5.4697, -38.1675)
  line L7 (-5.4697, -38.1675) -> (-9.4669, -35.1638)
  point P0 (0, 0)
  dimension "d24" = 5
  dimension "d25" = 5
  dimension "d26" = 27
extrude "Extrusion3" add sketch "Sketch4" along normal blind 15 contours L3 L2 L1 L0 | L7 L6 L5 L4
sketch "Sketch5" plane through (-63.5128, -53.8187, 5) normal (-0.7994, 0.6007, 0) x (0, 0, 1)
  line L0 (0, 0) -> (0, 47.381) projected
  line L1 (0, 0) -> (15, 0) projected
  line L2 (15, 47.381) -> (15, 0) projected
  line L3 (0, 47.381) -> (15, 47.381) projected
  line L4 (15, 0) -> (15, 47.381) projected
  line L5 (15, 42.381) -> (5, -1.85)
  line L6 (5, -1.85) -> (0, -1.85)
  line L7 (0, -1.85) -> (0, 0)
  line L8 (15, 42.381) -> (15, -1.85)
  line L9 (15, -1.85) -> (5, -1.85)
  point P0 (-5, 81.1797)
  dimension "d29" = 5
  dimension "d30" = 5
extrude "Extrusion4" cut sketch "Sketch5" against normal blind 41.9875 contours L5 L2 L1 | L1 L8 L9 L5
properties part number "Soporte motor 2"
